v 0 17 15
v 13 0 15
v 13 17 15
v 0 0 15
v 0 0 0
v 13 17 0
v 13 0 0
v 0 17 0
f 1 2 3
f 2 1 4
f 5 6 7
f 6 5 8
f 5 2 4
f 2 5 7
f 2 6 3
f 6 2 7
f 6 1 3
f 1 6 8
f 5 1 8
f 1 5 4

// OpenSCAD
// Generated by SolidPython 1.0.1 on 2020-07-29 00:46:55


cube(size = [13, 17, 15]);
/***********************************************
*********      SolidPython code:      **********
************************************************
 
# import packages: SolidPython
from solid import *
from solid.utils import *
from itertools import chain, combinations, permutations


class Resize:

    def __init__(self, scad_file):
        self.scad_file = scad_file
        #self.scad_file = import_scad(scad_file)
        # cone/cylinder param:
        self.r1 = 0
        self.r2 = 0
        self.h = 0
        # rectangular prism param:
        self.w = 0
        self.l = 0
        # ellipse param:
        self.r = 0

    # import OpenScad code (file name corresponds to shape)


    # classify shape + parameters
    def assign(self, param1, param2, param3):
        if self.scad_file == 'cone.scad':
            self.r1 = param1
            self.r2 = param2
            self.h = param3
        elif self.scad_file == 'cylinder.scad':
            self.r1 = param1
            self.r2 = param2
            self.h = param3
        elif self.scad_file == 'rectangularPrism.scad':
            self.h = param1
            self.l = param2
            self.w = param3
        else:
            self.r = param1
            self.h = param2

    # resize parameters
    def iterate(self):
        x = range(3, 20, 2)
        i = 1
        if self.scad_file == 'cone.scad':
            tempList = list(permutations(x, 2))
            for temp in tempList:
                param1 = temp[0]
                param2 = temp[1]
                filepath = 'produced_scad_files/' + 'cone' + str(param1) + '_' + str(param2) + '_' + '.scad'
                scad_render_to_file(cylinder(h=param1, r1=param2, r2=0), filepath)

        elif self.scad_file == 'cylinder.scad':
            tempList = list(permutations(x, 3))
            for temp in tempList:
                param1 = temp[0]
                param2 = temp[1]
                filepath = 'produced_scad_files/' + 'cylinder' + str(param1) + '_' + str(param2) + '_' + '.scad'
                scad_render_to_file(cylinder(h=param1, r1=param2, r2=param2), filepath)

        elif self.scad_file == 'rectangularPrism.scad':
            tempList = list(permutations(x, 3))
            for temp in tempList:
                param1 = temp[0]
                param2 = temp[1]
                param3 = temp[2]
                filepath = 'produced_scad_files/' + 'rectangularPrism' + str(param1) + '_' + str(param2) + '_' + str(
                    param3) + '.scad'
                scad_render_to_file(cube(size=(param1, param2, param3)), filepath)

        elif self.scad_file == 'ellipse.scad':
            tempList = list(permutations(x, 4))
            for temp in tempList:
                param1 = temp[0]
                param2 = temp[1]
                param3 = temp[2]
                param4 = temp[3]
                filepath = 'produced_scad_files/' + 'ellipse' + str(param1) + '_' + str(param2) + '_' + str(param3) + '_' + str(param4) + '.scad'
                scad_render_to_file(scale([param1, param2, param3])(sphere(r=param4)), filepath)

    def render_to_scadfile(self):
        scad_render_to_file(scad, 'example.scad') 
 
************************************************/
